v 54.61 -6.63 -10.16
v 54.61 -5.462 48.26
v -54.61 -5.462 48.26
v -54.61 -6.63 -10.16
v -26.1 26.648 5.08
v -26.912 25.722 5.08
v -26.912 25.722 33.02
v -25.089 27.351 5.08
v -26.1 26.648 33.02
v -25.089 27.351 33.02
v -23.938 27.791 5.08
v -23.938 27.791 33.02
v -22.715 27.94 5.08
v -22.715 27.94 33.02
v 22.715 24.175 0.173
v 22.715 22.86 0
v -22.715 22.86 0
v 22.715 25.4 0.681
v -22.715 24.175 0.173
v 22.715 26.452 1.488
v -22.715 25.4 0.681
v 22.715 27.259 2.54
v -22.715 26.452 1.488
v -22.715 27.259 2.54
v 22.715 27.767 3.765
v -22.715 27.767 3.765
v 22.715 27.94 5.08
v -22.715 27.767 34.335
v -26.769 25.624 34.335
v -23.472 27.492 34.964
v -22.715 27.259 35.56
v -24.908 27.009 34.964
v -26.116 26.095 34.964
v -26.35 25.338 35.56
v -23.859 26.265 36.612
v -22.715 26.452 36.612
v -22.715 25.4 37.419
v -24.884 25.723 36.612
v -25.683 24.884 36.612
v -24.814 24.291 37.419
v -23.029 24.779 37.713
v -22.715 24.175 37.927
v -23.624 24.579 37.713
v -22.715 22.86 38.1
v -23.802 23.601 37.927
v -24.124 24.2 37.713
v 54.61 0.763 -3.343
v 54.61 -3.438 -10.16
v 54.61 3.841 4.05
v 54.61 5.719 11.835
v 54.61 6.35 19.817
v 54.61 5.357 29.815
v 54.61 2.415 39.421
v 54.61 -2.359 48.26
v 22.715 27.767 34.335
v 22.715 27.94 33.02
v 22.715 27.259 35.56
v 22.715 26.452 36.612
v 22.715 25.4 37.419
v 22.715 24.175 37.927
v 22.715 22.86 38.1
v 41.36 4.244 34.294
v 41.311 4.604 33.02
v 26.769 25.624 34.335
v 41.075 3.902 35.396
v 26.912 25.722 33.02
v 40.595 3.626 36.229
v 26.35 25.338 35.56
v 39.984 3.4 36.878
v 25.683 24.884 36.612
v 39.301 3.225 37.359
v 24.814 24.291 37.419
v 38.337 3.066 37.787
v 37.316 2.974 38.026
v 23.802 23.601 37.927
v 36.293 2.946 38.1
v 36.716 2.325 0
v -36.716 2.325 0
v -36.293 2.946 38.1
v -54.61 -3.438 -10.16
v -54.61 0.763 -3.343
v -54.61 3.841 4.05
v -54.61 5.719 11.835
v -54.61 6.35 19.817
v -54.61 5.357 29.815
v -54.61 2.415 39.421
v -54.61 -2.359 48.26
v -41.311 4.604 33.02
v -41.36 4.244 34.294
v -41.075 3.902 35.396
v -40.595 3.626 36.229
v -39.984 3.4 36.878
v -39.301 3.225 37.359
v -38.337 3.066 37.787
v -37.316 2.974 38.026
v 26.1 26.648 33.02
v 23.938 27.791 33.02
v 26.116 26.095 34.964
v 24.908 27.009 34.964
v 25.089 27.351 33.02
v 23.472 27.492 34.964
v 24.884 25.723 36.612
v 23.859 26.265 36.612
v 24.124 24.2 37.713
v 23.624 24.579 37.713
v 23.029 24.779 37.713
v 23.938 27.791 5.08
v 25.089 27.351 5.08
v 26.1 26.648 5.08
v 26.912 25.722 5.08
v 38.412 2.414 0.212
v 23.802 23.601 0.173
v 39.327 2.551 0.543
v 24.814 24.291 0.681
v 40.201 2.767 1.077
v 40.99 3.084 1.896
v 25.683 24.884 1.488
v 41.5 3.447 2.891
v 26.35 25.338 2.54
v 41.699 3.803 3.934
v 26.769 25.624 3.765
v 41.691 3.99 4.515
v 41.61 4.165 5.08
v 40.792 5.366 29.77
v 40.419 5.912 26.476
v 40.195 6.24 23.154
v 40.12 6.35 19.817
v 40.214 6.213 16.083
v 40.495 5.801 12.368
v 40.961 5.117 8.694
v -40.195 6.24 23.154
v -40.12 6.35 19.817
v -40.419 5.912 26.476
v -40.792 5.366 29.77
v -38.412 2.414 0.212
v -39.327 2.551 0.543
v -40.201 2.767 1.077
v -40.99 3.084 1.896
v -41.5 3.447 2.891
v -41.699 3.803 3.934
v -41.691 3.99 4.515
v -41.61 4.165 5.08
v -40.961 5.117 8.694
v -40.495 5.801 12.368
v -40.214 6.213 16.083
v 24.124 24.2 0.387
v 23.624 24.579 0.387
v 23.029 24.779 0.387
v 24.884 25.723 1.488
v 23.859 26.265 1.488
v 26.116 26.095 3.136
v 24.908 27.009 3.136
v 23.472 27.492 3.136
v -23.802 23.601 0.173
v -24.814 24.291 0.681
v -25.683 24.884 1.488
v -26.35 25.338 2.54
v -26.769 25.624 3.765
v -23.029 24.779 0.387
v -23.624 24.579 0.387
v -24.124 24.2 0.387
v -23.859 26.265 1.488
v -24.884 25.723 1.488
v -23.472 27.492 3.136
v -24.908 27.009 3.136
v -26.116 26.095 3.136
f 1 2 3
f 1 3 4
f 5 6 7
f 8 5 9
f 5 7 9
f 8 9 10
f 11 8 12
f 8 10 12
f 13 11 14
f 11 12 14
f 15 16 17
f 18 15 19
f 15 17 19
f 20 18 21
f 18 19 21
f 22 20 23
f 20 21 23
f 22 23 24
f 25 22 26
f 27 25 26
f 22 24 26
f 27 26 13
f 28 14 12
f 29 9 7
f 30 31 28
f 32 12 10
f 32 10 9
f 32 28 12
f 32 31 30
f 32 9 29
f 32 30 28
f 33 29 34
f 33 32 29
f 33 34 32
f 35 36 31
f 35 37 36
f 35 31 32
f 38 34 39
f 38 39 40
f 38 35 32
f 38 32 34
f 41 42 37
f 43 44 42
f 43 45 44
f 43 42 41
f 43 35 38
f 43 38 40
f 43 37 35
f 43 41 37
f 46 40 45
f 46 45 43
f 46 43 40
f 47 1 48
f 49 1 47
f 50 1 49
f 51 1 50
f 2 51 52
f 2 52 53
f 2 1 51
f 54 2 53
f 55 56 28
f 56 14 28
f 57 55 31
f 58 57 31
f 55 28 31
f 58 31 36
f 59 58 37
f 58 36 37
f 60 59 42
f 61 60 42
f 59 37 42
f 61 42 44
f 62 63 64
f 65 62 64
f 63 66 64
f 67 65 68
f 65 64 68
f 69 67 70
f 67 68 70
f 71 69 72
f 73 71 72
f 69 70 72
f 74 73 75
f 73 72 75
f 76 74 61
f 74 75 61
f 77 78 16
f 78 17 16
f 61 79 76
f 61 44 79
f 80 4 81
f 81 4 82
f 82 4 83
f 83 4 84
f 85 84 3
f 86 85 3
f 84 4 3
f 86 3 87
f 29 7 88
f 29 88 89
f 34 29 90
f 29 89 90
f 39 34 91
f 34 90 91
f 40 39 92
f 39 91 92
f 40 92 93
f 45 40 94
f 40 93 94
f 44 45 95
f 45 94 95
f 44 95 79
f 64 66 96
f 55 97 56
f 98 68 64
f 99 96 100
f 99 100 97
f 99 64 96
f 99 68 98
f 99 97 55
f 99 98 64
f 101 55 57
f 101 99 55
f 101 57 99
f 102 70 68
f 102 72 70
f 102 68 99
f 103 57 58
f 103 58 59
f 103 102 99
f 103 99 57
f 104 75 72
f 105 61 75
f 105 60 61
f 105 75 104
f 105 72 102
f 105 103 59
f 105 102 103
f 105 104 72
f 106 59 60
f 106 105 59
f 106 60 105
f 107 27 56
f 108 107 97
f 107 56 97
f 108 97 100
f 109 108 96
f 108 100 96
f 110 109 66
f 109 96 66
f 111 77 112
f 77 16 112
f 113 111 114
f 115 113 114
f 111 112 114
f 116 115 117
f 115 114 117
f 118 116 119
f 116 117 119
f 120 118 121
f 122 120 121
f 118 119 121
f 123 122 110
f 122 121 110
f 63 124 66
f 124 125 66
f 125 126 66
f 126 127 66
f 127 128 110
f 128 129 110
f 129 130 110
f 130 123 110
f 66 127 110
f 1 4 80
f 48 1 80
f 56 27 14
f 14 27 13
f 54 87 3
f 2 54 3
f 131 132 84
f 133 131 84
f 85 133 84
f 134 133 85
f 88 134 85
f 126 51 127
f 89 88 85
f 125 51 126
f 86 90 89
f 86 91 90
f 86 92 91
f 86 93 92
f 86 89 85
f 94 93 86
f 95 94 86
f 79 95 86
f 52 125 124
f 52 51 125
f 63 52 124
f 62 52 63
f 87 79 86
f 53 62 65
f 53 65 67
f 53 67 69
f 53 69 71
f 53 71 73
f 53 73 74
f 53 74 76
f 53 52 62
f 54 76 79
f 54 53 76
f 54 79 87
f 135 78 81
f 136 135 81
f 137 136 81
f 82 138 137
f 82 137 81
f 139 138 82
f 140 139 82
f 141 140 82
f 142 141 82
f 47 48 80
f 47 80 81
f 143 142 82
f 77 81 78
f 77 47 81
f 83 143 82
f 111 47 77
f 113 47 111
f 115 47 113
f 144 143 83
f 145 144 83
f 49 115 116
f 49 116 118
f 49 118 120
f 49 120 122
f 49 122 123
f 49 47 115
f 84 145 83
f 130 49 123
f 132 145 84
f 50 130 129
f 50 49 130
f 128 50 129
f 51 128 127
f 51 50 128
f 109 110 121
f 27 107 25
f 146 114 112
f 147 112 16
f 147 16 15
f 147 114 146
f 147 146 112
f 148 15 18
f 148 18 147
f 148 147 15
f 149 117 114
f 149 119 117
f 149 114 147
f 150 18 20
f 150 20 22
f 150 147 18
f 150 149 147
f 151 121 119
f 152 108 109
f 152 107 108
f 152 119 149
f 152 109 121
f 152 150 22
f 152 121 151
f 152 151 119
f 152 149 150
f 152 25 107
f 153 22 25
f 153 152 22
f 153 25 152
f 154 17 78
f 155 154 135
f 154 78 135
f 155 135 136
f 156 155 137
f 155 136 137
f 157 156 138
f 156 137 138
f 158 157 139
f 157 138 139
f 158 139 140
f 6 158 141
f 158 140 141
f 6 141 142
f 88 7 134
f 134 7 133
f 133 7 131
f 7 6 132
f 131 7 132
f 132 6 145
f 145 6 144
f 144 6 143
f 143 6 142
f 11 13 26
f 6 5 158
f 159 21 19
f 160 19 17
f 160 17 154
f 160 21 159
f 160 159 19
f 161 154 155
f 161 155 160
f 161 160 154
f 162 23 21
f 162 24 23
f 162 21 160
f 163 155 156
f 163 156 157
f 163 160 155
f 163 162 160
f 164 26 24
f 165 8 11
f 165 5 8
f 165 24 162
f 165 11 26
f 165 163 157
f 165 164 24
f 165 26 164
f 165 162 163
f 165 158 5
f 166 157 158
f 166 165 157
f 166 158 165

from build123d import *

# Parameters (mm, degrees)
F2_DEPTH      = 38.1
F4_DEPTH      = 12.7
F4_DEPTH_BACK = 96.52
F5_R          = 5.08
F7_R          = 5.08
F8_R          = 5.08


with BuildPart() as f2:
    # F1 (on Top) → F2 (new body)
    with BuildSketch(Plane.XY):
        Polygon((-25.4, 27.94), (-44.45, 0), (44.45, 0), (25.4, 27.94), align=None)
        Polygon((-37.240951, 3.81), (-23.386406, 24.13), (23.386406, 24.13), (37.240951, 3.81), align=None, mode=Mode.SUBTRACT)
        Polygon((23.386406, 24.13), (-23.386406, 24.13), (-37.240951, 3.81), (37.240951, 3.81), align=None)
    extrude(amount=F2_DEPTH)

    # F3 (on offset) → F4 (join, two sides)
    with BuildSketch(Plane.YZ.offset(41.91)) as f4_sk:
        with BuildLine():
            ThreePointArc((-3.437933, -10.16), (3.84106, 4.050015), (6.35, 19.817498))
            ThreePointArc((6.35, 19.817498), (4.124015, 34.690461), (-2.35886, 48.26))
            Line((-2.35886, 48.26), (-5.46216, 48.26))
            ThreePointArc((-5.46216, 48.26), (1.433443, 34.775346), (3.81, 19.817498))
            ThreePointArc((3.81, 19.817498), (1.125414, 3.945848), (-6.629672, -10.16))
            Line((-6.629672, -10.16), (-3.437933, -10.16))
        make_face()
        with BuildLine():
            ThreePointArc((3.81, 19.817498), (1.433443, 34.775346), (-5.46216, 48.26))
            Line((-5.46216, 48.26), (-6.629672, -10.16))
            ThreePointArc((-6.629672, -10.16), (1.125414, 3.945848), (3.81, 19.817498))
        make_face()
    extrude(amount=F4_DEPTH)
    extrude(f4_sk.sketch, amount=-F4_DEPTH_BACK)

    # F5
    f5_edges = [f2.edges().sort_by_distance(p)[0] for p in [
        (25.4, 27.94, 19.05),
        (-25.4, 27.94, 19.05),
    ]]
    fillet(f5_edges, radius=F5_R)

    # F7
    f7_edges = [f2.edges().sort_by_distance(p)[0] for p in [
        (34.888585, 14.023408, 0),
    ]]
    fillet(f7_edges, radius=F7_R)

    # F8
    f8_edges = [f2.edges().sort_by_distance(p)[0] for p in [
        (-34.67687, 14.333925, 38.1),
    ]]
    fillet(f8_edges, radius=F8_R)


solid = f2.part
